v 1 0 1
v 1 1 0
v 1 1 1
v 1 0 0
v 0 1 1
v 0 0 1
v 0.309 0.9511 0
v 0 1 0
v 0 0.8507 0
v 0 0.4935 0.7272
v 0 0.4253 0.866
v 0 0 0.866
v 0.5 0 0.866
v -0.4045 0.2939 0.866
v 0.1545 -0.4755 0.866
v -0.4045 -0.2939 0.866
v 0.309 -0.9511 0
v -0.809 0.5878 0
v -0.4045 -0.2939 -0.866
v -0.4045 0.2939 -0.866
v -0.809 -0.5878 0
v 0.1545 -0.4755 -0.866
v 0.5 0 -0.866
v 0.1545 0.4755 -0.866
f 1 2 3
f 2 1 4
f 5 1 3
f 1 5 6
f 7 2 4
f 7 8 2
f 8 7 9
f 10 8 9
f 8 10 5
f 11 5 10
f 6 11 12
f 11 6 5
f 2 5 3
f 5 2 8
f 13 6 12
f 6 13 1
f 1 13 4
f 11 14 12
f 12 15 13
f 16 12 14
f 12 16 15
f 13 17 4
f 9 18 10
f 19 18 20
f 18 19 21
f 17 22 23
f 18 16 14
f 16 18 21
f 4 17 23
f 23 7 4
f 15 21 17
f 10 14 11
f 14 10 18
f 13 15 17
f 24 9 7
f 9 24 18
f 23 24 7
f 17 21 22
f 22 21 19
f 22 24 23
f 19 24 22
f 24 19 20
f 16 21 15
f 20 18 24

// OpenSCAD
module a__helper() cube(1);
module a__foo() a__helper();
module b__helper() sphere(1);
module b__bar() b__helper();
a__foo();
b__bar();
